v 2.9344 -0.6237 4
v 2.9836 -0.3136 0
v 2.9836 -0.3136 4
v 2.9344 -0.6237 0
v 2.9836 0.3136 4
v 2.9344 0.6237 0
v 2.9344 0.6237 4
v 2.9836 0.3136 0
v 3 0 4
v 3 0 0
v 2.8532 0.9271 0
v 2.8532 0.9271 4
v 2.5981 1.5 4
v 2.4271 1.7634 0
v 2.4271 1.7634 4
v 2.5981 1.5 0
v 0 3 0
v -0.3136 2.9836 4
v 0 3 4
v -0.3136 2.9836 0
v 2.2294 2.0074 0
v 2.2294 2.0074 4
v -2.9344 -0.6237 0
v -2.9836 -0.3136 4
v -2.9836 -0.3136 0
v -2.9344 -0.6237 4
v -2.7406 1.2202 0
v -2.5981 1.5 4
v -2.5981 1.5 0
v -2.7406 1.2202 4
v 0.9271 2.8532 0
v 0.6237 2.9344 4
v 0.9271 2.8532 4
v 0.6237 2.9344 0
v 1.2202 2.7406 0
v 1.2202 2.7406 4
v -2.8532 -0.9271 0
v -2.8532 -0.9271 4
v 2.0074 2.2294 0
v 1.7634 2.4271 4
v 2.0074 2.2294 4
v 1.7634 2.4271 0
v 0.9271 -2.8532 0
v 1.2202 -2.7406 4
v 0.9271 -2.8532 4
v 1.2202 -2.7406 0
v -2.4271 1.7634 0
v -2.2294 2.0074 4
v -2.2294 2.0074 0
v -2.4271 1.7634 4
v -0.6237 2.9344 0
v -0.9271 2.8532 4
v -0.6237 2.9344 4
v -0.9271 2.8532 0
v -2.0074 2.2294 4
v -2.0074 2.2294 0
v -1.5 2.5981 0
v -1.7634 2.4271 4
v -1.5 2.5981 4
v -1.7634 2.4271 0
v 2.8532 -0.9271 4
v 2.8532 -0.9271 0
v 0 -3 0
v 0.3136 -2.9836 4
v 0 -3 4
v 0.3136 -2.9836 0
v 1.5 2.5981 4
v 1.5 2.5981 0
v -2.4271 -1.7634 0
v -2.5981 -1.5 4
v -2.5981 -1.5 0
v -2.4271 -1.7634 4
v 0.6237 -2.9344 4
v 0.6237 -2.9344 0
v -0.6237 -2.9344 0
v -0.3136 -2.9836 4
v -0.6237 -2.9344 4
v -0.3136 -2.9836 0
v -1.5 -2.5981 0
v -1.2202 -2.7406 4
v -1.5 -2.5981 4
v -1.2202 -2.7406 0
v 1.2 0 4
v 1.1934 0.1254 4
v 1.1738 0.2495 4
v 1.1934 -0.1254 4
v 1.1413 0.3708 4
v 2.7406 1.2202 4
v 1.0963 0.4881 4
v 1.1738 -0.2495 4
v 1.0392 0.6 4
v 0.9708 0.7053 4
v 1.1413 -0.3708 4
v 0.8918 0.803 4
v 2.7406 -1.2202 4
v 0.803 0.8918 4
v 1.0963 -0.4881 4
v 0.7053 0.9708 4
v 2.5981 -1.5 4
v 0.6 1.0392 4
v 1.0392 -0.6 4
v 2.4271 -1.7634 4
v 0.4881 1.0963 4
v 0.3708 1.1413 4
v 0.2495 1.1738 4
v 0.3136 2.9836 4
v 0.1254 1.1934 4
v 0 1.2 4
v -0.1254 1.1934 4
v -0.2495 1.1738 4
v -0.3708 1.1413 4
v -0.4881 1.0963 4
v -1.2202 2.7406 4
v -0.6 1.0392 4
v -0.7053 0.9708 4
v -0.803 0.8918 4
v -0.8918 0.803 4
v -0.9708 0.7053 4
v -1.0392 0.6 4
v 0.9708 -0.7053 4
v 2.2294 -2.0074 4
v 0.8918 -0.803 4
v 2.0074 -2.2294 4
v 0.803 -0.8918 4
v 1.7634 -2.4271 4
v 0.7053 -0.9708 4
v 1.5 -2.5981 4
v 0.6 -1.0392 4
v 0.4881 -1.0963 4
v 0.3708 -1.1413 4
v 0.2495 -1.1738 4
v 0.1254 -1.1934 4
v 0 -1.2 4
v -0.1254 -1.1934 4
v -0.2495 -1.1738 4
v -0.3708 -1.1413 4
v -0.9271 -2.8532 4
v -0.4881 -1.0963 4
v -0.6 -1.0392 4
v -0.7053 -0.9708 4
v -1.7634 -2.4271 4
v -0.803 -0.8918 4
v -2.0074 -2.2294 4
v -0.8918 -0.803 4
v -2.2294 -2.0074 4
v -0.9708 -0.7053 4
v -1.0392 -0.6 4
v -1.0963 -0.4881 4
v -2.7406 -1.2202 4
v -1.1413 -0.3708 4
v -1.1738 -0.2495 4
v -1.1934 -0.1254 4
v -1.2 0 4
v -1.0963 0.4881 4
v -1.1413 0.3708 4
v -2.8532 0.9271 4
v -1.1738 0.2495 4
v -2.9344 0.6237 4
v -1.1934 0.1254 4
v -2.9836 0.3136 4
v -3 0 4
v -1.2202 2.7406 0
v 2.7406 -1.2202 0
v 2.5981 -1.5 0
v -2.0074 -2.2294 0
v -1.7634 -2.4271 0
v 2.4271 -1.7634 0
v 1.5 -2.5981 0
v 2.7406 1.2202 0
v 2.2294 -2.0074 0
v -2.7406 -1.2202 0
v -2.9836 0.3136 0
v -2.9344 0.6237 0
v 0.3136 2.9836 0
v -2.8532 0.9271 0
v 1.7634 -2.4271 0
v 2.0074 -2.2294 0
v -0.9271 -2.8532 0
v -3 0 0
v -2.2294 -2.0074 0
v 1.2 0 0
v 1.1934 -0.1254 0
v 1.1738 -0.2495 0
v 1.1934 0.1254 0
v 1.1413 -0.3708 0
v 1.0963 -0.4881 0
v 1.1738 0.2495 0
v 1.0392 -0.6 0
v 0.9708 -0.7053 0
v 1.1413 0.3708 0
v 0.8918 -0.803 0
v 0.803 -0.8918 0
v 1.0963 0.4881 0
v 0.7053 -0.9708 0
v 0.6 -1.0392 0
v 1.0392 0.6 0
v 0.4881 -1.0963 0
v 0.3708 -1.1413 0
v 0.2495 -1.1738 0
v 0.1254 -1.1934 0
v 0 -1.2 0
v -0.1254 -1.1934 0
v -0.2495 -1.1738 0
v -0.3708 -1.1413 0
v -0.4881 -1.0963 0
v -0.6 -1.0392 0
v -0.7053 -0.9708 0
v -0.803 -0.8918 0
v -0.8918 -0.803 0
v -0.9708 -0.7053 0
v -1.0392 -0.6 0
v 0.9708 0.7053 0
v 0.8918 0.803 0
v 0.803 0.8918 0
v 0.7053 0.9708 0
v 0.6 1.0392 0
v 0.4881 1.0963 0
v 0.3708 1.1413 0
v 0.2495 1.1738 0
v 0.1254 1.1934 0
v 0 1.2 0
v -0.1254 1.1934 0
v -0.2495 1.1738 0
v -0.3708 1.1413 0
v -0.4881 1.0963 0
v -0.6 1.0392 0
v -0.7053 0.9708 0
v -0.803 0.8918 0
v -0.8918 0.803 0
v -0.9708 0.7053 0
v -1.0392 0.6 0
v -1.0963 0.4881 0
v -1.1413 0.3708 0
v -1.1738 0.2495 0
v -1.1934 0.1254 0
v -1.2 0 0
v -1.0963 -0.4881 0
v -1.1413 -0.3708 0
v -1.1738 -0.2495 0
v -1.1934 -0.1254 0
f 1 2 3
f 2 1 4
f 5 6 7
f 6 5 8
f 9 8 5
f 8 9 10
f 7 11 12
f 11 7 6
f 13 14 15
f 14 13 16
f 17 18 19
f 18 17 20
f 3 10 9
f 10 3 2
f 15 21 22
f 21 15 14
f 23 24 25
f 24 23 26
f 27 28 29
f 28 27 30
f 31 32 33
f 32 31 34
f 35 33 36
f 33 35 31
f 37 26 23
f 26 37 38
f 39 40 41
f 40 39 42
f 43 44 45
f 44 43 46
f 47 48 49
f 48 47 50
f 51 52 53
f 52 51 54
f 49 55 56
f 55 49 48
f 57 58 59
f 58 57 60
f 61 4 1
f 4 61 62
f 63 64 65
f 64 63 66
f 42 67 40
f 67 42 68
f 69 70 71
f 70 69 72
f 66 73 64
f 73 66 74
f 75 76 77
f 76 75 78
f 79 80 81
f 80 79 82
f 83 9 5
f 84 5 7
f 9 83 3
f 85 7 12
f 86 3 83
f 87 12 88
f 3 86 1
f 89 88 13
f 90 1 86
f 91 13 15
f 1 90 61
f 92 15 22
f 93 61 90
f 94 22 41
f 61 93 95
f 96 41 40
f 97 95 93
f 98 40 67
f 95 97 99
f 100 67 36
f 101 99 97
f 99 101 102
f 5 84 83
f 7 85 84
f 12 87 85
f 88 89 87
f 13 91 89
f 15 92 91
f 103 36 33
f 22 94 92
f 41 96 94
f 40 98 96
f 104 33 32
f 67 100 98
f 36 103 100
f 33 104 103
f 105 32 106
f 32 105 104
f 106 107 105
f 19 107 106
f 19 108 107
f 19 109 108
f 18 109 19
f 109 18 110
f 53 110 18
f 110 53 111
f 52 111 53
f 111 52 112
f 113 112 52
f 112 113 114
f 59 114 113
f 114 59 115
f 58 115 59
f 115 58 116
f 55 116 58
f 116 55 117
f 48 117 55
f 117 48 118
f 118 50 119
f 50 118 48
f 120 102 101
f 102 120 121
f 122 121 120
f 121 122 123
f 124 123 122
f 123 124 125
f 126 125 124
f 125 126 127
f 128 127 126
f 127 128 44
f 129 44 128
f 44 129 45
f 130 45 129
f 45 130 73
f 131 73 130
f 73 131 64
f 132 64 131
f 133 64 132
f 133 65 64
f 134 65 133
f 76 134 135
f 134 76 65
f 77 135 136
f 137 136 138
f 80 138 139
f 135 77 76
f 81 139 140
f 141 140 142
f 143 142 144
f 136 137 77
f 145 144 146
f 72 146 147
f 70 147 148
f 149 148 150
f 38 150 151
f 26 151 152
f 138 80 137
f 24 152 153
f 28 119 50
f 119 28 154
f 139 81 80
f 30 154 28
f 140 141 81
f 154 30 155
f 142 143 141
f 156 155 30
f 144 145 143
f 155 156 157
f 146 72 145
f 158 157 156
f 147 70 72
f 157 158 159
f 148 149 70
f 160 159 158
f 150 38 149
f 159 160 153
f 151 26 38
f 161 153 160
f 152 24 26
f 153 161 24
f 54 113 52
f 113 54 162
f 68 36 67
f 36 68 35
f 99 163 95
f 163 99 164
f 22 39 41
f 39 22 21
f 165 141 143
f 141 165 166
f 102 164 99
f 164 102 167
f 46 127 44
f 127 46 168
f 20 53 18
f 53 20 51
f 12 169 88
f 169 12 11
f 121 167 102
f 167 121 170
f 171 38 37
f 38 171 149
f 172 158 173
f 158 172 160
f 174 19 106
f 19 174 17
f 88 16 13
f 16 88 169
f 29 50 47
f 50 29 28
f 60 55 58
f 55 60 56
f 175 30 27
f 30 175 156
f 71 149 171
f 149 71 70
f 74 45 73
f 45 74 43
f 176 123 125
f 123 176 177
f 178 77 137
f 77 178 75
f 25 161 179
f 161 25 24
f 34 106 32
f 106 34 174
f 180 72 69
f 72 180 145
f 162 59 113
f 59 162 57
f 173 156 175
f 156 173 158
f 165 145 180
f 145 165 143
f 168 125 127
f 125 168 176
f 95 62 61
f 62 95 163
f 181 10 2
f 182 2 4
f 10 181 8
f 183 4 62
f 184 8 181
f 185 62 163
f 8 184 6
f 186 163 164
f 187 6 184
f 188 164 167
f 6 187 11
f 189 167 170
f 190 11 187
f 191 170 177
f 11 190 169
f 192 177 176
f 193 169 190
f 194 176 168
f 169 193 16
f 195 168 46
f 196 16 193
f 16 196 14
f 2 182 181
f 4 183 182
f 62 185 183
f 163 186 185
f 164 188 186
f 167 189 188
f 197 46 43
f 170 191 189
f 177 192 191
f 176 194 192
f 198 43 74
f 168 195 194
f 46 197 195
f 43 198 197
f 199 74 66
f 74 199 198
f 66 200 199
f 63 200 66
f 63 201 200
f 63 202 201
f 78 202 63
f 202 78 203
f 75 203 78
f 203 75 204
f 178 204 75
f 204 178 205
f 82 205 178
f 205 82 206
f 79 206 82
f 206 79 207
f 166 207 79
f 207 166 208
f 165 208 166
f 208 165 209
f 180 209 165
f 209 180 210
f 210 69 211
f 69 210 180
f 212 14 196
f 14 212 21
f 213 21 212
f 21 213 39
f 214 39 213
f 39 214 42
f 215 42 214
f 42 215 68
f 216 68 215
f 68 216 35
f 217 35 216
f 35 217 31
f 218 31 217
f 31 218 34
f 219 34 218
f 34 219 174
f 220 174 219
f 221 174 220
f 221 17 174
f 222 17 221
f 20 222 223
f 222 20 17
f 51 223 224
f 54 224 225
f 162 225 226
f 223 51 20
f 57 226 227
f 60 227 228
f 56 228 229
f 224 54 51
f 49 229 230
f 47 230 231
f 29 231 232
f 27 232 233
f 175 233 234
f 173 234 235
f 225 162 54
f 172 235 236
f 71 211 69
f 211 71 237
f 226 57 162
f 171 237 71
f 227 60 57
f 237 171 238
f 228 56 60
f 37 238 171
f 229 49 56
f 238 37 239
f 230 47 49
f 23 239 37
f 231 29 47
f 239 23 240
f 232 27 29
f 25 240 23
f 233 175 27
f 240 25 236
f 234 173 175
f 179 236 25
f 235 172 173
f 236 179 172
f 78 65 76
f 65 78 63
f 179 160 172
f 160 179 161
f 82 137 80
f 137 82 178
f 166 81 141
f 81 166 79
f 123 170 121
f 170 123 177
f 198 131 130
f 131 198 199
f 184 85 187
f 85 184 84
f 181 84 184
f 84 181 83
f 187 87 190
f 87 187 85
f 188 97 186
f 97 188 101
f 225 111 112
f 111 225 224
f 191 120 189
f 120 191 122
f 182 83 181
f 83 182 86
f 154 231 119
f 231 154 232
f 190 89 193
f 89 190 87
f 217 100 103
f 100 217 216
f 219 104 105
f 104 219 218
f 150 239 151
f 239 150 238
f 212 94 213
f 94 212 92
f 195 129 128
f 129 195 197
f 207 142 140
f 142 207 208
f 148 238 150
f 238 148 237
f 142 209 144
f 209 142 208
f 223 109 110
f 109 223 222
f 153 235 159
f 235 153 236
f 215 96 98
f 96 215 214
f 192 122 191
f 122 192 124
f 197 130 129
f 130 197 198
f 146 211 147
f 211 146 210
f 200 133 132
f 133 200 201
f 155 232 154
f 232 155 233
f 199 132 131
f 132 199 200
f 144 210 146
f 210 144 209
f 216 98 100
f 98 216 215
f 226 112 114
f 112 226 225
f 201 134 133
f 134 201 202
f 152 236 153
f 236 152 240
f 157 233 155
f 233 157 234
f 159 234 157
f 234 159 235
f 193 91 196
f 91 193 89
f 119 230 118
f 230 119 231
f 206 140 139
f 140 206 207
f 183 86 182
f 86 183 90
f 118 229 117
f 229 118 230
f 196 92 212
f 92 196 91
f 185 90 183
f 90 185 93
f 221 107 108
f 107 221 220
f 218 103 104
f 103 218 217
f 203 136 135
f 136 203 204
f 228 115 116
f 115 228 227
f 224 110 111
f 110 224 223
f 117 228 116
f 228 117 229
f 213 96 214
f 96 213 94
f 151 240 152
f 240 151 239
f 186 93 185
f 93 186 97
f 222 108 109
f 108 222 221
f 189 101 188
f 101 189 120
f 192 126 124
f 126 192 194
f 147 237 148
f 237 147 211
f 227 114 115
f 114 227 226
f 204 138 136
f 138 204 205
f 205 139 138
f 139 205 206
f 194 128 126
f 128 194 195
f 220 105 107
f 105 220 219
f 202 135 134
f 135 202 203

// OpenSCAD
// Round spacer.
$fn = 60;
eps = 0.02;
inner_d = 2.4;
outer_d = 6;
length = 4;
difference() { cylinder(d=outer_d,h=length); translate([0,0,-eps]) cylinder(d=inner_d,h=length+2*eps); }
